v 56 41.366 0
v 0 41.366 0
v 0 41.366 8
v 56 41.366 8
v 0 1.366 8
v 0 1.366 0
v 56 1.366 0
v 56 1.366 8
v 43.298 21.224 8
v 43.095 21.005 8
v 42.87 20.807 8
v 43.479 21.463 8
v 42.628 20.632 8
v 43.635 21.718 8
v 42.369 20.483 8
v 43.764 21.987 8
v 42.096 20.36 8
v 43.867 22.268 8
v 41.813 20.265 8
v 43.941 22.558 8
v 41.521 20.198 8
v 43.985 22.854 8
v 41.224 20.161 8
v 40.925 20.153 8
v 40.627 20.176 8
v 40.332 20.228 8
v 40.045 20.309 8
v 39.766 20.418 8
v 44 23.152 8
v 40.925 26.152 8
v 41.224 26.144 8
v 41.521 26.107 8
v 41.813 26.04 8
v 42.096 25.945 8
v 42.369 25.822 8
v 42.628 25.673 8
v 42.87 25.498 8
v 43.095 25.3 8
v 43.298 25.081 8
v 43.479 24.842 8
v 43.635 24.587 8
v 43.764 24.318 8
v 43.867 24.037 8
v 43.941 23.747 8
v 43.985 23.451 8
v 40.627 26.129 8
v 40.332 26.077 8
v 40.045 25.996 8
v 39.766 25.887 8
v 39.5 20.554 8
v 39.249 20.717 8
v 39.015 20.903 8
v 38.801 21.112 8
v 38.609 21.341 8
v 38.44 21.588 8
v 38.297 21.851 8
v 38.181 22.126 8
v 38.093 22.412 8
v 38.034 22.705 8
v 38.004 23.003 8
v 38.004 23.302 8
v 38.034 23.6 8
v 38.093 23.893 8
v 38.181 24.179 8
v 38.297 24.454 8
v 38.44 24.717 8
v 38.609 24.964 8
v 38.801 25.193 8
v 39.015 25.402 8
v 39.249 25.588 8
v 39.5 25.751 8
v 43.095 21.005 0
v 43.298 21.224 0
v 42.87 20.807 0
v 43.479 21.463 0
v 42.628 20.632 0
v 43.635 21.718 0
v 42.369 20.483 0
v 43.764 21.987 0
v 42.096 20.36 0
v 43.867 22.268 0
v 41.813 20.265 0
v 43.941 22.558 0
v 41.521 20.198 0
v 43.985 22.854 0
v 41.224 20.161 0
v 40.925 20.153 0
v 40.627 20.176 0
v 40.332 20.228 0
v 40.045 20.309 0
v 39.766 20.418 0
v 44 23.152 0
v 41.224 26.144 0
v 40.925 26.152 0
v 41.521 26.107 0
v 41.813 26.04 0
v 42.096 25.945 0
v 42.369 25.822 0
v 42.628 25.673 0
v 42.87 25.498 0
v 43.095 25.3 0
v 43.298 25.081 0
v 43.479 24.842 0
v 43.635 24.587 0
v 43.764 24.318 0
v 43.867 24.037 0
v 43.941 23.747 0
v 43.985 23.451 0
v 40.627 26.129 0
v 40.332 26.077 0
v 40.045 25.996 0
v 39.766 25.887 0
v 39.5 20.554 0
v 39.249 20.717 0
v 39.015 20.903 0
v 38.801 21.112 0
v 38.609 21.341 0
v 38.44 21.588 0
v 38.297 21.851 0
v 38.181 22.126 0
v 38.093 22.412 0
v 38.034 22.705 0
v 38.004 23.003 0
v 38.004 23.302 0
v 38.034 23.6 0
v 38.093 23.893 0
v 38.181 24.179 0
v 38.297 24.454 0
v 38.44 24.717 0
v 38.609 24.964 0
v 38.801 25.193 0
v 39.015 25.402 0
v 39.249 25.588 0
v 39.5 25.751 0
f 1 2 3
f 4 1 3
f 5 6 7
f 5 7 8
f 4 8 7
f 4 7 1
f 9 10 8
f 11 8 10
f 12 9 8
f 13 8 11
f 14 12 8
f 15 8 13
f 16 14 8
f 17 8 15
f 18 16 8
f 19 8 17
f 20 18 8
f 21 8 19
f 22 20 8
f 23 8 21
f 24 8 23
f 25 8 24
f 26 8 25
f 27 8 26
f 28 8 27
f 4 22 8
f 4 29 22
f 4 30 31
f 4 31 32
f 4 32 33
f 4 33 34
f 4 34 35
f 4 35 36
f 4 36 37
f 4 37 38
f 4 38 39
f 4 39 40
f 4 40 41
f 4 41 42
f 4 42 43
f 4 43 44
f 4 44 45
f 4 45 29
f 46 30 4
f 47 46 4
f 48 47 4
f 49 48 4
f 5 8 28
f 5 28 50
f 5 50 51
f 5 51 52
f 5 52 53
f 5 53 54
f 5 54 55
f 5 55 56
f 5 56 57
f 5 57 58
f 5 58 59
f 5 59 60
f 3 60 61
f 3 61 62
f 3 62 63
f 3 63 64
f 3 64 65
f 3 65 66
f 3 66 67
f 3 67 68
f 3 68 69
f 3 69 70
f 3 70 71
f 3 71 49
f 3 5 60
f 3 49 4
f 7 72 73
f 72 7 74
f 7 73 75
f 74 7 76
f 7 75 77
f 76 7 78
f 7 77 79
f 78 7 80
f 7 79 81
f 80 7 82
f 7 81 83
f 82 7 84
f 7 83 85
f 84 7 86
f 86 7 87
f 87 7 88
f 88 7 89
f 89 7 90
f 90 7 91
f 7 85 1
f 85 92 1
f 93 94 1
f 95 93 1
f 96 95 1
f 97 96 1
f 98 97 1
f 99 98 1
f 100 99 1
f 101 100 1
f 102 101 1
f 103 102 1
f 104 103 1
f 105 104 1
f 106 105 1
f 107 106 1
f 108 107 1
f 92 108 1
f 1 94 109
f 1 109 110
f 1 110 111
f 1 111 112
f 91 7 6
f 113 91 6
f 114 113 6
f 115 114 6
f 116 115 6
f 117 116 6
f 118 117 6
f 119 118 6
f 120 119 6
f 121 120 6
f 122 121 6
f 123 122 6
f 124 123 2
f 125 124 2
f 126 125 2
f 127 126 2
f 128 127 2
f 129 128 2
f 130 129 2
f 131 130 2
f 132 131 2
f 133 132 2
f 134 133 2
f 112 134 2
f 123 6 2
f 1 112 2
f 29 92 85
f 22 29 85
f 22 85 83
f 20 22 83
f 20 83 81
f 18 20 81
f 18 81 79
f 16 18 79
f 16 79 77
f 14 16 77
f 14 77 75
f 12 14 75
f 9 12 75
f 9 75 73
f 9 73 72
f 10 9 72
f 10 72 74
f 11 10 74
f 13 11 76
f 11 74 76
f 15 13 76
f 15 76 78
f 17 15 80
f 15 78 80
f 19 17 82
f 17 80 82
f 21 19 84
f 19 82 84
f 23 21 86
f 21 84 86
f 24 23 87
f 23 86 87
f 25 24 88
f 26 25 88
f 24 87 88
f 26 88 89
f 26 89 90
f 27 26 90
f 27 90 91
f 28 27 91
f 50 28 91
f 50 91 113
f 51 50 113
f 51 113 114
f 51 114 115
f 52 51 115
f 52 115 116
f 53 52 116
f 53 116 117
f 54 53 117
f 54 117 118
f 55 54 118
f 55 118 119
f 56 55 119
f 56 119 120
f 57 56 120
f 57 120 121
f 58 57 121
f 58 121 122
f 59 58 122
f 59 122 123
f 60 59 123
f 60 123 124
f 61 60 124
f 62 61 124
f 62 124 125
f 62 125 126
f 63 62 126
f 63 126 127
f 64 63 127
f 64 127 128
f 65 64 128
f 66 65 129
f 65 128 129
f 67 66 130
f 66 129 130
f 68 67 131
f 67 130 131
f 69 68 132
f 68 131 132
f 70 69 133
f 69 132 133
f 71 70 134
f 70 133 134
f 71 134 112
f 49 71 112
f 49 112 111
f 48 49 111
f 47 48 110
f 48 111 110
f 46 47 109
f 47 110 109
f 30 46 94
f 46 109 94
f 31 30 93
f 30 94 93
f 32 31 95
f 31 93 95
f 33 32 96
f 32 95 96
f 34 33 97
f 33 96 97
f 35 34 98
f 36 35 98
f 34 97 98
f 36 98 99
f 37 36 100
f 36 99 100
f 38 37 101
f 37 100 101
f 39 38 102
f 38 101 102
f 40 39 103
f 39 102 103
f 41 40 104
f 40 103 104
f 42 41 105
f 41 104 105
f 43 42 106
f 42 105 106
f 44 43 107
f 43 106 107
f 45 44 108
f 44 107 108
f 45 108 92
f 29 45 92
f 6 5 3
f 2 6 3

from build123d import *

# Parameters (mm, degrees)
F0_W     = 40
F0_H     = 8
F1_DEPTH = 56
F2_R     = 3
F3_DEPTH = 11.1


with BuildPart() as f1:
    # F0 (on Right) → F1 (new body)
    with BuildSketch(Plane.YZ):
        with Locations((21.365855, 4)):
            Rectangle(F0_W, F0_H)
    extrude(amount=F1_DEPTH)

    # F2 (on face) → F3 (cut)
    with BuildSketch(Plane(origin=(0, 0, 0), x_dir=(1, 0, 0), z_dir=(0, 0, -1))):
        with Locations((41, -23.152475)):
            Circle(F2_R)
    extrude(amount=-F3_DEPTH, mode=Mode.SUBTRACT)


solid = f1.part
